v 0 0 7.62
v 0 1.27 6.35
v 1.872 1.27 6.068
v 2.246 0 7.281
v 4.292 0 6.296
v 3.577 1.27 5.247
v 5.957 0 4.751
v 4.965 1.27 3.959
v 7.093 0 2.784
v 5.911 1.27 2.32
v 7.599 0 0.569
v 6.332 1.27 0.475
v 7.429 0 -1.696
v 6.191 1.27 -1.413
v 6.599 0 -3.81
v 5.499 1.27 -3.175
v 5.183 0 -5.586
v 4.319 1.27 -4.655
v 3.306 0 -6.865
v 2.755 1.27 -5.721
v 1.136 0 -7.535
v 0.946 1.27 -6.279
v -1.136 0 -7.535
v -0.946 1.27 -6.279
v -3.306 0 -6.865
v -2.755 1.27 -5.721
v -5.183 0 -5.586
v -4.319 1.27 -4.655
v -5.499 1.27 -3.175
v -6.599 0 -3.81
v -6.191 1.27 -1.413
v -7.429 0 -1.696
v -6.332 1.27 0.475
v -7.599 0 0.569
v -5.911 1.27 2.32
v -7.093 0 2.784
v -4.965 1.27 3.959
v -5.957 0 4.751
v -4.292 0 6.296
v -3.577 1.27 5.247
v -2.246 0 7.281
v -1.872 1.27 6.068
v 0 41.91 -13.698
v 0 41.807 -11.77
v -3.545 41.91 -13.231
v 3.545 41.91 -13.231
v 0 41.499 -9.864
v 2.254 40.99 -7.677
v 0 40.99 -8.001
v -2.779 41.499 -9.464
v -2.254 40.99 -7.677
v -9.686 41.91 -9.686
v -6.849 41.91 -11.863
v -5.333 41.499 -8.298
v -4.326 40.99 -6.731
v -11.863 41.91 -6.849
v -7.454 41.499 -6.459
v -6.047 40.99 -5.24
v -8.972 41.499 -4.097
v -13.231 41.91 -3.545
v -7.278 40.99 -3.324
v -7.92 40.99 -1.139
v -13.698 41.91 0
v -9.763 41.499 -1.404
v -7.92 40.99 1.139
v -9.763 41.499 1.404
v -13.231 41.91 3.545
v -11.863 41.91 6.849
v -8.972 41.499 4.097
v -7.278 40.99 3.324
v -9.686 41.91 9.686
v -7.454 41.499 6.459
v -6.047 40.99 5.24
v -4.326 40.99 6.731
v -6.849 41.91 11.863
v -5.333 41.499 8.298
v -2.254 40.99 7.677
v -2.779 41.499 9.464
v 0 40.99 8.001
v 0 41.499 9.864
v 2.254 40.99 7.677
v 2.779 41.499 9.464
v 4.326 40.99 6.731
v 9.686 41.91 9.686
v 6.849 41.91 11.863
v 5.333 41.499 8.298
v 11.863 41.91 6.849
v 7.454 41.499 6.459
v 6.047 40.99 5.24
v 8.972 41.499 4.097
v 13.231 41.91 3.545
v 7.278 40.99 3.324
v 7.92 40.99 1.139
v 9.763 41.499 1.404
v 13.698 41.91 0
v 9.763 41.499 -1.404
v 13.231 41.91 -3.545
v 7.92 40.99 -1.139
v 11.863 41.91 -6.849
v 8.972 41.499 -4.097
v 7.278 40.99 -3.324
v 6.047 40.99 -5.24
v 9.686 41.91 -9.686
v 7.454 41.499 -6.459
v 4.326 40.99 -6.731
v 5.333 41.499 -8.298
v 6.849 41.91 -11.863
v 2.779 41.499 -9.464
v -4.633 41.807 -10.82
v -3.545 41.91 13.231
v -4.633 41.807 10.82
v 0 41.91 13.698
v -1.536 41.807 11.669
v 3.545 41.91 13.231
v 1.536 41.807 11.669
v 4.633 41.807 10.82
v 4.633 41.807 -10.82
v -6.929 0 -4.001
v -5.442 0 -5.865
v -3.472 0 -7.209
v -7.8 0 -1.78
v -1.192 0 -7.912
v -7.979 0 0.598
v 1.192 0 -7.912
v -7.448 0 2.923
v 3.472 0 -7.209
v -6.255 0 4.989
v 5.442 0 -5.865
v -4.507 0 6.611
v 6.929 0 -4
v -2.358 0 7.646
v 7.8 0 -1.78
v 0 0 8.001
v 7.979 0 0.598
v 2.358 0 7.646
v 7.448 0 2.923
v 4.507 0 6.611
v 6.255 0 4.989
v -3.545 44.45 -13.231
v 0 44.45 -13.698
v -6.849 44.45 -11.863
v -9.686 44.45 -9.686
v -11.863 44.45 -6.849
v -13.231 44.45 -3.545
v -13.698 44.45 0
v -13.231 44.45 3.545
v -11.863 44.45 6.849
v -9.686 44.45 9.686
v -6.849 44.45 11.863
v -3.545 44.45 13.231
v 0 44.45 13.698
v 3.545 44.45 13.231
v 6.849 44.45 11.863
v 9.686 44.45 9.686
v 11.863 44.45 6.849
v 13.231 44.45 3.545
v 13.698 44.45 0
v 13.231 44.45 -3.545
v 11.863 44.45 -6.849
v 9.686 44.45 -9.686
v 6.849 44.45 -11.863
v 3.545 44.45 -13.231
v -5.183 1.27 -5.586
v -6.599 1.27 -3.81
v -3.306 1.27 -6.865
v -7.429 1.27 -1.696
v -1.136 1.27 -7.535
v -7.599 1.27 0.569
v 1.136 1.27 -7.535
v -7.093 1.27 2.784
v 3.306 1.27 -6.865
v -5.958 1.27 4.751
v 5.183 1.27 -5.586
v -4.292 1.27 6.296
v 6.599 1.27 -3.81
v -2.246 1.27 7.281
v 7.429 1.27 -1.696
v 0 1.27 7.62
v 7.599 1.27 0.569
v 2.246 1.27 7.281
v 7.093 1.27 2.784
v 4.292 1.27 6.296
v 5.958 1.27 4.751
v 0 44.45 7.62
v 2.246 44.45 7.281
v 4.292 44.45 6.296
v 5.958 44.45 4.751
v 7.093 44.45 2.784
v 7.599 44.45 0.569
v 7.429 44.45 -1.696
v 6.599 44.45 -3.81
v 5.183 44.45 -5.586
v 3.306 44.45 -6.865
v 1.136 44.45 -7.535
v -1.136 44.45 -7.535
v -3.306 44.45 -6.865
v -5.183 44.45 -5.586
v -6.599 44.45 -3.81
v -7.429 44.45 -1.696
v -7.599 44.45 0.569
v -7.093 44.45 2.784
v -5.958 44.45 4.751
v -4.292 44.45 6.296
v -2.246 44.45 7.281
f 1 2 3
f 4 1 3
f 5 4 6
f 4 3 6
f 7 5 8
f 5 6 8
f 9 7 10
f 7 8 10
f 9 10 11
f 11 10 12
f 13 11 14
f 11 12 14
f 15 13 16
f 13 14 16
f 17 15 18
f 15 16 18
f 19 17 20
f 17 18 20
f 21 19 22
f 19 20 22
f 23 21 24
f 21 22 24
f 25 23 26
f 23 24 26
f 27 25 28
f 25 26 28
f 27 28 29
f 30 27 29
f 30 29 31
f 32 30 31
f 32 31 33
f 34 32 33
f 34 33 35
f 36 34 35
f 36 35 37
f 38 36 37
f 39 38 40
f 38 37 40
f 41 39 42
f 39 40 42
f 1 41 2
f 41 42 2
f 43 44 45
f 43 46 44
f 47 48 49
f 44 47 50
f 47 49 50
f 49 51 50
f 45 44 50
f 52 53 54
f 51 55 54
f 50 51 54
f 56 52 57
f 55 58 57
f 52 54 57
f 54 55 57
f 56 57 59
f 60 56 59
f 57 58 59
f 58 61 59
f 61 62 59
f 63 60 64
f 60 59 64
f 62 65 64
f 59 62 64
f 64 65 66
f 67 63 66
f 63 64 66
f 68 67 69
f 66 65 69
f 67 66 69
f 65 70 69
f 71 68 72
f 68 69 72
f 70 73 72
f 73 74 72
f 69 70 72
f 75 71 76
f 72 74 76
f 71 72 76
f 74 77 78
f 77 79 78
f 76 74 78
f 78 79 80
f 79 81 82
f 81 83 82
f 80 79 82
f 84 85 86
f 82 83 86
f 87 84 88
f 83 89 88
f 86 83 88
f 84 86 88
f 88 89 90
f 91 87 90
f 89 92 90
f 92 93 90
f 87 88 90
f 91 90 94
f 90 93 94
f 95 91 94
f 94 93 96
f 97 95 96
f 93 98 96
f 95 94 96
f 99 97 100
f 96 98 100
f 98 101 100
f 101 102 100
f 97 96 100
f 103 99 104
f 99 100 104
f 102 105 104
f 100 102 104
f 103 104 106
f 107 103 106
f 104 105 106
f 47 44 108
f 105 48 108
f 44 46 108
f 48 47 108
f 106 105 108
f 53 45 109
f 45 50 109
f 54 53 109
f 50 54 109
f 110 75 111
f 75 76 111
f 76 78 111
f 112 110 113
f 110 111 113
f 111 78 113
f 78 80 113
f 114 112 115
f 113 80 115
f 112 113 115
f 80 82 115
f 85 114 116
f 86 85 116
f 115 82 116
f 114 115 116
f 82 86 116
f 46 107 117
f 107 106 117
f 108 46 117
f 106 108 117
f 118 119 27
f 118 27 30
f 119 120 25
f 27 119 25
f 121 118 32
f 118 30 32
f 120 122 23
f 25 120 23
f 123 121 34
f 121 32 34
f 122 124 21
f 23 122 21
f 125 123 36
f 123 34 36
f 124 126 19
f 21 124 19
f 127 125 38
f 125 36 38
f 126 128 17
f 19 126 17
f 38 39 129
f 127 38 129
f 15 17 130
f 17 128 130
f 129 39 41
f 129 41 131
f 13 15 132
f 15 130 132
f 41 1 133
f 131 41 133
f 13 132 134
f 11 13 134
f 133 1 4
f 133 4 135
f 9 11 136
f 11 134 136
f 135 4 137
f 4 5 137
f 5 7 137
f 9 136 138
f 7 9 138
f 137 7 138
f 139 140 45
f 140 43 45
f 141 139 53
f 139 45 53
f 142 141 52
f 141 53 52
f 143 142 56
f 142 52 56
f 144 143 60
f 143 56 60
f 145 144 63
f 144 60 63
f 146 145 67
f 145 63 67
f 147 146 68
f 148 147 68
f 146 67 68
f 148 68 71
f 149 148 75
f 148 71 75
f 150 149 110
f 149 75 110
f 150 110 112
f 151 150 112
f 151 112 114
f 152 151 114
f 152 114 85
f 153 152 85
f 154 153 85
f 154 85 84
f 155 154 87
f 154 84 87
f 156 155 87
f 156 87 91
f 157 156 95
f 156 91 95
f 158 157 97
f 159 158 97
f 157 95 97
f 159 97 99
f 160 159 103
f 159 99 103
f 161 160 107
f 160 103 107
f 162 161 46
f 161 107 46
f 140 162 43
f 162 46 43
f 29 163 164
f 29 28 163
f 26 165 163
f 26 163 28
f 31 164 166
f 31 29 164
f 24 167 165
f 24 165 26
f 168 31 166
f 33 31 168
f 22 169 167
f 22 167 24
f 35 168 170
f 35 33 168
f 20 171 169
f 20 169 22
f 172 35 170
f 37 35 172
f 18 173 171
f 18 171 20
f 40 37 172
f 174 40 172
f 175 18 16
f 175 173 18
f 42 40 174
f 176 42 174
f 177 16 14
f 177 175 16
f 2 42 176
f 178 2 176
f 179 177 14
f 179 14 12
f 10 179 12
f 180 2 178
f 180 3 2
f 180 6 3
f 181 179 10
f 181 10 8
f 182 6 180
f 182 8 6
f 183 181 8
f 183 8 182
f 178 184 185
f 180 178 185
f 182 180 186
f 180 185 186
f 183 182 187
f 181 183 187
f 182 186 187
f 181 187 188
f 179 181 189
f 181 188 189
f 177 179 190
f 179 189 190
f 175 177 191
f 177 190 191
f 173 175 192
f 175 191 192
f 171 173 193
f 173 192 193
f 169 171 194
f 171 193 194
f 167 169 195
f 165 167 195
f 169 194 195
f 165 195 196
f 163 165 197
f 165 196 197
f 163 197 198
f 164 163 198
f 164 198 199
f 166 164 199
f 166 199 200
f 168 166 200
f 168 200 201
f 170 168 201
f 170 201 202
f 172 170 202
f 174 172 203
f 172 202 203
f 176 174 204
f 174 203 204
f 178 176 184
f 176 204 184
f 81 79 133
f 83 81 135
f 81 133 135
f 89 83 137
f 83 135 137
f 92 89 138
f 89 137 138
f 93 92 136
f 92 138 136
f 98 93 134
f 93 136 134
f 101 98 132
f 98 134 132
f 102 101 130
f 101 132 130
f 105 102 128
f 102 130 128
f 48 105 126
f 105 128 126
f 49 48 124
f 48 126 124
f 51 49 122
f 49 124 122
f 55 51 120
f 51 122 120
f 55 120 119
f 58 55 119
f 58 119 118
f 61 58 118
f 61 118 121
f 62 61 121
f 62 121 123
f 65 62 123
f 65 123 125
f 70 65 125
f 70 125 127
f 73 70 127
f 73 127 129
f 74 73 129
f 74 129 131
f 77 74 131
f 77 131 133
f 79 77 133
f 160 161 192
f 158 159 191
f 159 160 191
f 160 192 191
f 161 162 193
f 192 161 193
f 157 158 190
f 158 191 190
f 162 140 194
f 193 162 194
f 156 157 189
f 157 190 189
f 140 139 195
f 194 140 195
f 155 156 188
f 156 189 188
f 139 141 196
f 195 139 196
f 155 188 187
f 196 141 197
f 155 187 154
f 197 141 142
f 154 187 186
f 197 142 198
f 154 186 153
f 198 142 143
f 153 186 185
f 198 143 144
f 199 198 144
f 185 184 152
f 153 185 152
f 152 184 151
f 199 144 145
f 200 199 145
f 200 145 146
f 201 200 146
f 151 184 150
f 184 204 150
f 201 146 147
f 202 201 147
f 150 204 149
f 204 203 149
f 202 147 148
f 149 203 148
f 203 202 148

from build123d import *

# Parameters (mm, degrees)
SKETCH1_R           = 8.001
BOSS_EXTRUDE1_DEPTH = 44.45
SKETCH2_R           = 7.62
CUT_EXTRUDE1_DEPTH  = 43.18
SKETCH3_R           = 6.35
CUT_EXTRUDE2_DEPTH  = 1.27
CHAMFER2_SIZE       = 1.27


with BuildPart() as part:
    # Sketch1 → Boss-Extrude1 (new body)
    with BuildSketch(Plane(origin=(0, 0, 0), x_dir=(1, 0, 0), z_dir=(0, 1, 0))):
        with Locations(Location((0, 0, 0), (0, 0, 270))):
            Circle(SKETCH1_R)
    extrude(amount=BOSS_EXTRUDE1_DEPTH)

    # Sketch2 → Cut-Extrude1 (cut)
    with BuildSketch(Plane(origin=(0, 44.45, 0), x_dir=(1, 0, 0), z_dir=(0, 1, 0))):
        with Locations(Location((0, 0, 0), (0, 0, 270))):
            Circle(SKETCH2_R)
    extrude(amount=-CUT_EXTRUDE1_DEPTH, mode=Mode.SUBTRACT)

    # Sketch3 → Cut-Extrude2 (cut)
    with BuildSketch(Plane(origin=(0, 1.27, 0), x_dir=(1, 0, 0), z_dir=(0, 1, 0))):
        with Locations(Location((0, 0, 0), (0, 0, 270))):
            Circle(SKETCH3_R)
    extrude(amount=-CUT_EXTRUDE2_DEPTH, mode=Mode.SUBTRACT)

    # Chamfer2
    chamfer2_edges = [part.edges().sort_by_distance(p)[0] for p in [
        (0, 0, -6.35),
    ]]
    chamfer(chamfer2_edges, length=CHAMFER2_SIZE - 0.0001)  # a hair under: the kernel refuses the full size

    # Sketch5 → Revolve1 (revolve)
    with BuildSketch(Plane.XY, mode=Mode.PRIVATE) as revolve1_sk:
        with BuildLine():
            Line((8.001, 44.45), (13.698005601, 44.45))
            Line((13.698005601, 44.45), (13.698005601, 41.91))
            ThreePointArc((13.698005601, 41.91), (10.812623084, 41.67859503), (8.001, 40.990295557))
            Line((8.001, 40.990295557), (8.001, 44.45))
        make_face()
    revolve(revolve1_sk.sketch.rotate(Axis((0, 1.27, 0), (0, 1, 0)), 90), axis=Axis((0, 1.27, 0), (0, 1, 0)))


solid = part.part
